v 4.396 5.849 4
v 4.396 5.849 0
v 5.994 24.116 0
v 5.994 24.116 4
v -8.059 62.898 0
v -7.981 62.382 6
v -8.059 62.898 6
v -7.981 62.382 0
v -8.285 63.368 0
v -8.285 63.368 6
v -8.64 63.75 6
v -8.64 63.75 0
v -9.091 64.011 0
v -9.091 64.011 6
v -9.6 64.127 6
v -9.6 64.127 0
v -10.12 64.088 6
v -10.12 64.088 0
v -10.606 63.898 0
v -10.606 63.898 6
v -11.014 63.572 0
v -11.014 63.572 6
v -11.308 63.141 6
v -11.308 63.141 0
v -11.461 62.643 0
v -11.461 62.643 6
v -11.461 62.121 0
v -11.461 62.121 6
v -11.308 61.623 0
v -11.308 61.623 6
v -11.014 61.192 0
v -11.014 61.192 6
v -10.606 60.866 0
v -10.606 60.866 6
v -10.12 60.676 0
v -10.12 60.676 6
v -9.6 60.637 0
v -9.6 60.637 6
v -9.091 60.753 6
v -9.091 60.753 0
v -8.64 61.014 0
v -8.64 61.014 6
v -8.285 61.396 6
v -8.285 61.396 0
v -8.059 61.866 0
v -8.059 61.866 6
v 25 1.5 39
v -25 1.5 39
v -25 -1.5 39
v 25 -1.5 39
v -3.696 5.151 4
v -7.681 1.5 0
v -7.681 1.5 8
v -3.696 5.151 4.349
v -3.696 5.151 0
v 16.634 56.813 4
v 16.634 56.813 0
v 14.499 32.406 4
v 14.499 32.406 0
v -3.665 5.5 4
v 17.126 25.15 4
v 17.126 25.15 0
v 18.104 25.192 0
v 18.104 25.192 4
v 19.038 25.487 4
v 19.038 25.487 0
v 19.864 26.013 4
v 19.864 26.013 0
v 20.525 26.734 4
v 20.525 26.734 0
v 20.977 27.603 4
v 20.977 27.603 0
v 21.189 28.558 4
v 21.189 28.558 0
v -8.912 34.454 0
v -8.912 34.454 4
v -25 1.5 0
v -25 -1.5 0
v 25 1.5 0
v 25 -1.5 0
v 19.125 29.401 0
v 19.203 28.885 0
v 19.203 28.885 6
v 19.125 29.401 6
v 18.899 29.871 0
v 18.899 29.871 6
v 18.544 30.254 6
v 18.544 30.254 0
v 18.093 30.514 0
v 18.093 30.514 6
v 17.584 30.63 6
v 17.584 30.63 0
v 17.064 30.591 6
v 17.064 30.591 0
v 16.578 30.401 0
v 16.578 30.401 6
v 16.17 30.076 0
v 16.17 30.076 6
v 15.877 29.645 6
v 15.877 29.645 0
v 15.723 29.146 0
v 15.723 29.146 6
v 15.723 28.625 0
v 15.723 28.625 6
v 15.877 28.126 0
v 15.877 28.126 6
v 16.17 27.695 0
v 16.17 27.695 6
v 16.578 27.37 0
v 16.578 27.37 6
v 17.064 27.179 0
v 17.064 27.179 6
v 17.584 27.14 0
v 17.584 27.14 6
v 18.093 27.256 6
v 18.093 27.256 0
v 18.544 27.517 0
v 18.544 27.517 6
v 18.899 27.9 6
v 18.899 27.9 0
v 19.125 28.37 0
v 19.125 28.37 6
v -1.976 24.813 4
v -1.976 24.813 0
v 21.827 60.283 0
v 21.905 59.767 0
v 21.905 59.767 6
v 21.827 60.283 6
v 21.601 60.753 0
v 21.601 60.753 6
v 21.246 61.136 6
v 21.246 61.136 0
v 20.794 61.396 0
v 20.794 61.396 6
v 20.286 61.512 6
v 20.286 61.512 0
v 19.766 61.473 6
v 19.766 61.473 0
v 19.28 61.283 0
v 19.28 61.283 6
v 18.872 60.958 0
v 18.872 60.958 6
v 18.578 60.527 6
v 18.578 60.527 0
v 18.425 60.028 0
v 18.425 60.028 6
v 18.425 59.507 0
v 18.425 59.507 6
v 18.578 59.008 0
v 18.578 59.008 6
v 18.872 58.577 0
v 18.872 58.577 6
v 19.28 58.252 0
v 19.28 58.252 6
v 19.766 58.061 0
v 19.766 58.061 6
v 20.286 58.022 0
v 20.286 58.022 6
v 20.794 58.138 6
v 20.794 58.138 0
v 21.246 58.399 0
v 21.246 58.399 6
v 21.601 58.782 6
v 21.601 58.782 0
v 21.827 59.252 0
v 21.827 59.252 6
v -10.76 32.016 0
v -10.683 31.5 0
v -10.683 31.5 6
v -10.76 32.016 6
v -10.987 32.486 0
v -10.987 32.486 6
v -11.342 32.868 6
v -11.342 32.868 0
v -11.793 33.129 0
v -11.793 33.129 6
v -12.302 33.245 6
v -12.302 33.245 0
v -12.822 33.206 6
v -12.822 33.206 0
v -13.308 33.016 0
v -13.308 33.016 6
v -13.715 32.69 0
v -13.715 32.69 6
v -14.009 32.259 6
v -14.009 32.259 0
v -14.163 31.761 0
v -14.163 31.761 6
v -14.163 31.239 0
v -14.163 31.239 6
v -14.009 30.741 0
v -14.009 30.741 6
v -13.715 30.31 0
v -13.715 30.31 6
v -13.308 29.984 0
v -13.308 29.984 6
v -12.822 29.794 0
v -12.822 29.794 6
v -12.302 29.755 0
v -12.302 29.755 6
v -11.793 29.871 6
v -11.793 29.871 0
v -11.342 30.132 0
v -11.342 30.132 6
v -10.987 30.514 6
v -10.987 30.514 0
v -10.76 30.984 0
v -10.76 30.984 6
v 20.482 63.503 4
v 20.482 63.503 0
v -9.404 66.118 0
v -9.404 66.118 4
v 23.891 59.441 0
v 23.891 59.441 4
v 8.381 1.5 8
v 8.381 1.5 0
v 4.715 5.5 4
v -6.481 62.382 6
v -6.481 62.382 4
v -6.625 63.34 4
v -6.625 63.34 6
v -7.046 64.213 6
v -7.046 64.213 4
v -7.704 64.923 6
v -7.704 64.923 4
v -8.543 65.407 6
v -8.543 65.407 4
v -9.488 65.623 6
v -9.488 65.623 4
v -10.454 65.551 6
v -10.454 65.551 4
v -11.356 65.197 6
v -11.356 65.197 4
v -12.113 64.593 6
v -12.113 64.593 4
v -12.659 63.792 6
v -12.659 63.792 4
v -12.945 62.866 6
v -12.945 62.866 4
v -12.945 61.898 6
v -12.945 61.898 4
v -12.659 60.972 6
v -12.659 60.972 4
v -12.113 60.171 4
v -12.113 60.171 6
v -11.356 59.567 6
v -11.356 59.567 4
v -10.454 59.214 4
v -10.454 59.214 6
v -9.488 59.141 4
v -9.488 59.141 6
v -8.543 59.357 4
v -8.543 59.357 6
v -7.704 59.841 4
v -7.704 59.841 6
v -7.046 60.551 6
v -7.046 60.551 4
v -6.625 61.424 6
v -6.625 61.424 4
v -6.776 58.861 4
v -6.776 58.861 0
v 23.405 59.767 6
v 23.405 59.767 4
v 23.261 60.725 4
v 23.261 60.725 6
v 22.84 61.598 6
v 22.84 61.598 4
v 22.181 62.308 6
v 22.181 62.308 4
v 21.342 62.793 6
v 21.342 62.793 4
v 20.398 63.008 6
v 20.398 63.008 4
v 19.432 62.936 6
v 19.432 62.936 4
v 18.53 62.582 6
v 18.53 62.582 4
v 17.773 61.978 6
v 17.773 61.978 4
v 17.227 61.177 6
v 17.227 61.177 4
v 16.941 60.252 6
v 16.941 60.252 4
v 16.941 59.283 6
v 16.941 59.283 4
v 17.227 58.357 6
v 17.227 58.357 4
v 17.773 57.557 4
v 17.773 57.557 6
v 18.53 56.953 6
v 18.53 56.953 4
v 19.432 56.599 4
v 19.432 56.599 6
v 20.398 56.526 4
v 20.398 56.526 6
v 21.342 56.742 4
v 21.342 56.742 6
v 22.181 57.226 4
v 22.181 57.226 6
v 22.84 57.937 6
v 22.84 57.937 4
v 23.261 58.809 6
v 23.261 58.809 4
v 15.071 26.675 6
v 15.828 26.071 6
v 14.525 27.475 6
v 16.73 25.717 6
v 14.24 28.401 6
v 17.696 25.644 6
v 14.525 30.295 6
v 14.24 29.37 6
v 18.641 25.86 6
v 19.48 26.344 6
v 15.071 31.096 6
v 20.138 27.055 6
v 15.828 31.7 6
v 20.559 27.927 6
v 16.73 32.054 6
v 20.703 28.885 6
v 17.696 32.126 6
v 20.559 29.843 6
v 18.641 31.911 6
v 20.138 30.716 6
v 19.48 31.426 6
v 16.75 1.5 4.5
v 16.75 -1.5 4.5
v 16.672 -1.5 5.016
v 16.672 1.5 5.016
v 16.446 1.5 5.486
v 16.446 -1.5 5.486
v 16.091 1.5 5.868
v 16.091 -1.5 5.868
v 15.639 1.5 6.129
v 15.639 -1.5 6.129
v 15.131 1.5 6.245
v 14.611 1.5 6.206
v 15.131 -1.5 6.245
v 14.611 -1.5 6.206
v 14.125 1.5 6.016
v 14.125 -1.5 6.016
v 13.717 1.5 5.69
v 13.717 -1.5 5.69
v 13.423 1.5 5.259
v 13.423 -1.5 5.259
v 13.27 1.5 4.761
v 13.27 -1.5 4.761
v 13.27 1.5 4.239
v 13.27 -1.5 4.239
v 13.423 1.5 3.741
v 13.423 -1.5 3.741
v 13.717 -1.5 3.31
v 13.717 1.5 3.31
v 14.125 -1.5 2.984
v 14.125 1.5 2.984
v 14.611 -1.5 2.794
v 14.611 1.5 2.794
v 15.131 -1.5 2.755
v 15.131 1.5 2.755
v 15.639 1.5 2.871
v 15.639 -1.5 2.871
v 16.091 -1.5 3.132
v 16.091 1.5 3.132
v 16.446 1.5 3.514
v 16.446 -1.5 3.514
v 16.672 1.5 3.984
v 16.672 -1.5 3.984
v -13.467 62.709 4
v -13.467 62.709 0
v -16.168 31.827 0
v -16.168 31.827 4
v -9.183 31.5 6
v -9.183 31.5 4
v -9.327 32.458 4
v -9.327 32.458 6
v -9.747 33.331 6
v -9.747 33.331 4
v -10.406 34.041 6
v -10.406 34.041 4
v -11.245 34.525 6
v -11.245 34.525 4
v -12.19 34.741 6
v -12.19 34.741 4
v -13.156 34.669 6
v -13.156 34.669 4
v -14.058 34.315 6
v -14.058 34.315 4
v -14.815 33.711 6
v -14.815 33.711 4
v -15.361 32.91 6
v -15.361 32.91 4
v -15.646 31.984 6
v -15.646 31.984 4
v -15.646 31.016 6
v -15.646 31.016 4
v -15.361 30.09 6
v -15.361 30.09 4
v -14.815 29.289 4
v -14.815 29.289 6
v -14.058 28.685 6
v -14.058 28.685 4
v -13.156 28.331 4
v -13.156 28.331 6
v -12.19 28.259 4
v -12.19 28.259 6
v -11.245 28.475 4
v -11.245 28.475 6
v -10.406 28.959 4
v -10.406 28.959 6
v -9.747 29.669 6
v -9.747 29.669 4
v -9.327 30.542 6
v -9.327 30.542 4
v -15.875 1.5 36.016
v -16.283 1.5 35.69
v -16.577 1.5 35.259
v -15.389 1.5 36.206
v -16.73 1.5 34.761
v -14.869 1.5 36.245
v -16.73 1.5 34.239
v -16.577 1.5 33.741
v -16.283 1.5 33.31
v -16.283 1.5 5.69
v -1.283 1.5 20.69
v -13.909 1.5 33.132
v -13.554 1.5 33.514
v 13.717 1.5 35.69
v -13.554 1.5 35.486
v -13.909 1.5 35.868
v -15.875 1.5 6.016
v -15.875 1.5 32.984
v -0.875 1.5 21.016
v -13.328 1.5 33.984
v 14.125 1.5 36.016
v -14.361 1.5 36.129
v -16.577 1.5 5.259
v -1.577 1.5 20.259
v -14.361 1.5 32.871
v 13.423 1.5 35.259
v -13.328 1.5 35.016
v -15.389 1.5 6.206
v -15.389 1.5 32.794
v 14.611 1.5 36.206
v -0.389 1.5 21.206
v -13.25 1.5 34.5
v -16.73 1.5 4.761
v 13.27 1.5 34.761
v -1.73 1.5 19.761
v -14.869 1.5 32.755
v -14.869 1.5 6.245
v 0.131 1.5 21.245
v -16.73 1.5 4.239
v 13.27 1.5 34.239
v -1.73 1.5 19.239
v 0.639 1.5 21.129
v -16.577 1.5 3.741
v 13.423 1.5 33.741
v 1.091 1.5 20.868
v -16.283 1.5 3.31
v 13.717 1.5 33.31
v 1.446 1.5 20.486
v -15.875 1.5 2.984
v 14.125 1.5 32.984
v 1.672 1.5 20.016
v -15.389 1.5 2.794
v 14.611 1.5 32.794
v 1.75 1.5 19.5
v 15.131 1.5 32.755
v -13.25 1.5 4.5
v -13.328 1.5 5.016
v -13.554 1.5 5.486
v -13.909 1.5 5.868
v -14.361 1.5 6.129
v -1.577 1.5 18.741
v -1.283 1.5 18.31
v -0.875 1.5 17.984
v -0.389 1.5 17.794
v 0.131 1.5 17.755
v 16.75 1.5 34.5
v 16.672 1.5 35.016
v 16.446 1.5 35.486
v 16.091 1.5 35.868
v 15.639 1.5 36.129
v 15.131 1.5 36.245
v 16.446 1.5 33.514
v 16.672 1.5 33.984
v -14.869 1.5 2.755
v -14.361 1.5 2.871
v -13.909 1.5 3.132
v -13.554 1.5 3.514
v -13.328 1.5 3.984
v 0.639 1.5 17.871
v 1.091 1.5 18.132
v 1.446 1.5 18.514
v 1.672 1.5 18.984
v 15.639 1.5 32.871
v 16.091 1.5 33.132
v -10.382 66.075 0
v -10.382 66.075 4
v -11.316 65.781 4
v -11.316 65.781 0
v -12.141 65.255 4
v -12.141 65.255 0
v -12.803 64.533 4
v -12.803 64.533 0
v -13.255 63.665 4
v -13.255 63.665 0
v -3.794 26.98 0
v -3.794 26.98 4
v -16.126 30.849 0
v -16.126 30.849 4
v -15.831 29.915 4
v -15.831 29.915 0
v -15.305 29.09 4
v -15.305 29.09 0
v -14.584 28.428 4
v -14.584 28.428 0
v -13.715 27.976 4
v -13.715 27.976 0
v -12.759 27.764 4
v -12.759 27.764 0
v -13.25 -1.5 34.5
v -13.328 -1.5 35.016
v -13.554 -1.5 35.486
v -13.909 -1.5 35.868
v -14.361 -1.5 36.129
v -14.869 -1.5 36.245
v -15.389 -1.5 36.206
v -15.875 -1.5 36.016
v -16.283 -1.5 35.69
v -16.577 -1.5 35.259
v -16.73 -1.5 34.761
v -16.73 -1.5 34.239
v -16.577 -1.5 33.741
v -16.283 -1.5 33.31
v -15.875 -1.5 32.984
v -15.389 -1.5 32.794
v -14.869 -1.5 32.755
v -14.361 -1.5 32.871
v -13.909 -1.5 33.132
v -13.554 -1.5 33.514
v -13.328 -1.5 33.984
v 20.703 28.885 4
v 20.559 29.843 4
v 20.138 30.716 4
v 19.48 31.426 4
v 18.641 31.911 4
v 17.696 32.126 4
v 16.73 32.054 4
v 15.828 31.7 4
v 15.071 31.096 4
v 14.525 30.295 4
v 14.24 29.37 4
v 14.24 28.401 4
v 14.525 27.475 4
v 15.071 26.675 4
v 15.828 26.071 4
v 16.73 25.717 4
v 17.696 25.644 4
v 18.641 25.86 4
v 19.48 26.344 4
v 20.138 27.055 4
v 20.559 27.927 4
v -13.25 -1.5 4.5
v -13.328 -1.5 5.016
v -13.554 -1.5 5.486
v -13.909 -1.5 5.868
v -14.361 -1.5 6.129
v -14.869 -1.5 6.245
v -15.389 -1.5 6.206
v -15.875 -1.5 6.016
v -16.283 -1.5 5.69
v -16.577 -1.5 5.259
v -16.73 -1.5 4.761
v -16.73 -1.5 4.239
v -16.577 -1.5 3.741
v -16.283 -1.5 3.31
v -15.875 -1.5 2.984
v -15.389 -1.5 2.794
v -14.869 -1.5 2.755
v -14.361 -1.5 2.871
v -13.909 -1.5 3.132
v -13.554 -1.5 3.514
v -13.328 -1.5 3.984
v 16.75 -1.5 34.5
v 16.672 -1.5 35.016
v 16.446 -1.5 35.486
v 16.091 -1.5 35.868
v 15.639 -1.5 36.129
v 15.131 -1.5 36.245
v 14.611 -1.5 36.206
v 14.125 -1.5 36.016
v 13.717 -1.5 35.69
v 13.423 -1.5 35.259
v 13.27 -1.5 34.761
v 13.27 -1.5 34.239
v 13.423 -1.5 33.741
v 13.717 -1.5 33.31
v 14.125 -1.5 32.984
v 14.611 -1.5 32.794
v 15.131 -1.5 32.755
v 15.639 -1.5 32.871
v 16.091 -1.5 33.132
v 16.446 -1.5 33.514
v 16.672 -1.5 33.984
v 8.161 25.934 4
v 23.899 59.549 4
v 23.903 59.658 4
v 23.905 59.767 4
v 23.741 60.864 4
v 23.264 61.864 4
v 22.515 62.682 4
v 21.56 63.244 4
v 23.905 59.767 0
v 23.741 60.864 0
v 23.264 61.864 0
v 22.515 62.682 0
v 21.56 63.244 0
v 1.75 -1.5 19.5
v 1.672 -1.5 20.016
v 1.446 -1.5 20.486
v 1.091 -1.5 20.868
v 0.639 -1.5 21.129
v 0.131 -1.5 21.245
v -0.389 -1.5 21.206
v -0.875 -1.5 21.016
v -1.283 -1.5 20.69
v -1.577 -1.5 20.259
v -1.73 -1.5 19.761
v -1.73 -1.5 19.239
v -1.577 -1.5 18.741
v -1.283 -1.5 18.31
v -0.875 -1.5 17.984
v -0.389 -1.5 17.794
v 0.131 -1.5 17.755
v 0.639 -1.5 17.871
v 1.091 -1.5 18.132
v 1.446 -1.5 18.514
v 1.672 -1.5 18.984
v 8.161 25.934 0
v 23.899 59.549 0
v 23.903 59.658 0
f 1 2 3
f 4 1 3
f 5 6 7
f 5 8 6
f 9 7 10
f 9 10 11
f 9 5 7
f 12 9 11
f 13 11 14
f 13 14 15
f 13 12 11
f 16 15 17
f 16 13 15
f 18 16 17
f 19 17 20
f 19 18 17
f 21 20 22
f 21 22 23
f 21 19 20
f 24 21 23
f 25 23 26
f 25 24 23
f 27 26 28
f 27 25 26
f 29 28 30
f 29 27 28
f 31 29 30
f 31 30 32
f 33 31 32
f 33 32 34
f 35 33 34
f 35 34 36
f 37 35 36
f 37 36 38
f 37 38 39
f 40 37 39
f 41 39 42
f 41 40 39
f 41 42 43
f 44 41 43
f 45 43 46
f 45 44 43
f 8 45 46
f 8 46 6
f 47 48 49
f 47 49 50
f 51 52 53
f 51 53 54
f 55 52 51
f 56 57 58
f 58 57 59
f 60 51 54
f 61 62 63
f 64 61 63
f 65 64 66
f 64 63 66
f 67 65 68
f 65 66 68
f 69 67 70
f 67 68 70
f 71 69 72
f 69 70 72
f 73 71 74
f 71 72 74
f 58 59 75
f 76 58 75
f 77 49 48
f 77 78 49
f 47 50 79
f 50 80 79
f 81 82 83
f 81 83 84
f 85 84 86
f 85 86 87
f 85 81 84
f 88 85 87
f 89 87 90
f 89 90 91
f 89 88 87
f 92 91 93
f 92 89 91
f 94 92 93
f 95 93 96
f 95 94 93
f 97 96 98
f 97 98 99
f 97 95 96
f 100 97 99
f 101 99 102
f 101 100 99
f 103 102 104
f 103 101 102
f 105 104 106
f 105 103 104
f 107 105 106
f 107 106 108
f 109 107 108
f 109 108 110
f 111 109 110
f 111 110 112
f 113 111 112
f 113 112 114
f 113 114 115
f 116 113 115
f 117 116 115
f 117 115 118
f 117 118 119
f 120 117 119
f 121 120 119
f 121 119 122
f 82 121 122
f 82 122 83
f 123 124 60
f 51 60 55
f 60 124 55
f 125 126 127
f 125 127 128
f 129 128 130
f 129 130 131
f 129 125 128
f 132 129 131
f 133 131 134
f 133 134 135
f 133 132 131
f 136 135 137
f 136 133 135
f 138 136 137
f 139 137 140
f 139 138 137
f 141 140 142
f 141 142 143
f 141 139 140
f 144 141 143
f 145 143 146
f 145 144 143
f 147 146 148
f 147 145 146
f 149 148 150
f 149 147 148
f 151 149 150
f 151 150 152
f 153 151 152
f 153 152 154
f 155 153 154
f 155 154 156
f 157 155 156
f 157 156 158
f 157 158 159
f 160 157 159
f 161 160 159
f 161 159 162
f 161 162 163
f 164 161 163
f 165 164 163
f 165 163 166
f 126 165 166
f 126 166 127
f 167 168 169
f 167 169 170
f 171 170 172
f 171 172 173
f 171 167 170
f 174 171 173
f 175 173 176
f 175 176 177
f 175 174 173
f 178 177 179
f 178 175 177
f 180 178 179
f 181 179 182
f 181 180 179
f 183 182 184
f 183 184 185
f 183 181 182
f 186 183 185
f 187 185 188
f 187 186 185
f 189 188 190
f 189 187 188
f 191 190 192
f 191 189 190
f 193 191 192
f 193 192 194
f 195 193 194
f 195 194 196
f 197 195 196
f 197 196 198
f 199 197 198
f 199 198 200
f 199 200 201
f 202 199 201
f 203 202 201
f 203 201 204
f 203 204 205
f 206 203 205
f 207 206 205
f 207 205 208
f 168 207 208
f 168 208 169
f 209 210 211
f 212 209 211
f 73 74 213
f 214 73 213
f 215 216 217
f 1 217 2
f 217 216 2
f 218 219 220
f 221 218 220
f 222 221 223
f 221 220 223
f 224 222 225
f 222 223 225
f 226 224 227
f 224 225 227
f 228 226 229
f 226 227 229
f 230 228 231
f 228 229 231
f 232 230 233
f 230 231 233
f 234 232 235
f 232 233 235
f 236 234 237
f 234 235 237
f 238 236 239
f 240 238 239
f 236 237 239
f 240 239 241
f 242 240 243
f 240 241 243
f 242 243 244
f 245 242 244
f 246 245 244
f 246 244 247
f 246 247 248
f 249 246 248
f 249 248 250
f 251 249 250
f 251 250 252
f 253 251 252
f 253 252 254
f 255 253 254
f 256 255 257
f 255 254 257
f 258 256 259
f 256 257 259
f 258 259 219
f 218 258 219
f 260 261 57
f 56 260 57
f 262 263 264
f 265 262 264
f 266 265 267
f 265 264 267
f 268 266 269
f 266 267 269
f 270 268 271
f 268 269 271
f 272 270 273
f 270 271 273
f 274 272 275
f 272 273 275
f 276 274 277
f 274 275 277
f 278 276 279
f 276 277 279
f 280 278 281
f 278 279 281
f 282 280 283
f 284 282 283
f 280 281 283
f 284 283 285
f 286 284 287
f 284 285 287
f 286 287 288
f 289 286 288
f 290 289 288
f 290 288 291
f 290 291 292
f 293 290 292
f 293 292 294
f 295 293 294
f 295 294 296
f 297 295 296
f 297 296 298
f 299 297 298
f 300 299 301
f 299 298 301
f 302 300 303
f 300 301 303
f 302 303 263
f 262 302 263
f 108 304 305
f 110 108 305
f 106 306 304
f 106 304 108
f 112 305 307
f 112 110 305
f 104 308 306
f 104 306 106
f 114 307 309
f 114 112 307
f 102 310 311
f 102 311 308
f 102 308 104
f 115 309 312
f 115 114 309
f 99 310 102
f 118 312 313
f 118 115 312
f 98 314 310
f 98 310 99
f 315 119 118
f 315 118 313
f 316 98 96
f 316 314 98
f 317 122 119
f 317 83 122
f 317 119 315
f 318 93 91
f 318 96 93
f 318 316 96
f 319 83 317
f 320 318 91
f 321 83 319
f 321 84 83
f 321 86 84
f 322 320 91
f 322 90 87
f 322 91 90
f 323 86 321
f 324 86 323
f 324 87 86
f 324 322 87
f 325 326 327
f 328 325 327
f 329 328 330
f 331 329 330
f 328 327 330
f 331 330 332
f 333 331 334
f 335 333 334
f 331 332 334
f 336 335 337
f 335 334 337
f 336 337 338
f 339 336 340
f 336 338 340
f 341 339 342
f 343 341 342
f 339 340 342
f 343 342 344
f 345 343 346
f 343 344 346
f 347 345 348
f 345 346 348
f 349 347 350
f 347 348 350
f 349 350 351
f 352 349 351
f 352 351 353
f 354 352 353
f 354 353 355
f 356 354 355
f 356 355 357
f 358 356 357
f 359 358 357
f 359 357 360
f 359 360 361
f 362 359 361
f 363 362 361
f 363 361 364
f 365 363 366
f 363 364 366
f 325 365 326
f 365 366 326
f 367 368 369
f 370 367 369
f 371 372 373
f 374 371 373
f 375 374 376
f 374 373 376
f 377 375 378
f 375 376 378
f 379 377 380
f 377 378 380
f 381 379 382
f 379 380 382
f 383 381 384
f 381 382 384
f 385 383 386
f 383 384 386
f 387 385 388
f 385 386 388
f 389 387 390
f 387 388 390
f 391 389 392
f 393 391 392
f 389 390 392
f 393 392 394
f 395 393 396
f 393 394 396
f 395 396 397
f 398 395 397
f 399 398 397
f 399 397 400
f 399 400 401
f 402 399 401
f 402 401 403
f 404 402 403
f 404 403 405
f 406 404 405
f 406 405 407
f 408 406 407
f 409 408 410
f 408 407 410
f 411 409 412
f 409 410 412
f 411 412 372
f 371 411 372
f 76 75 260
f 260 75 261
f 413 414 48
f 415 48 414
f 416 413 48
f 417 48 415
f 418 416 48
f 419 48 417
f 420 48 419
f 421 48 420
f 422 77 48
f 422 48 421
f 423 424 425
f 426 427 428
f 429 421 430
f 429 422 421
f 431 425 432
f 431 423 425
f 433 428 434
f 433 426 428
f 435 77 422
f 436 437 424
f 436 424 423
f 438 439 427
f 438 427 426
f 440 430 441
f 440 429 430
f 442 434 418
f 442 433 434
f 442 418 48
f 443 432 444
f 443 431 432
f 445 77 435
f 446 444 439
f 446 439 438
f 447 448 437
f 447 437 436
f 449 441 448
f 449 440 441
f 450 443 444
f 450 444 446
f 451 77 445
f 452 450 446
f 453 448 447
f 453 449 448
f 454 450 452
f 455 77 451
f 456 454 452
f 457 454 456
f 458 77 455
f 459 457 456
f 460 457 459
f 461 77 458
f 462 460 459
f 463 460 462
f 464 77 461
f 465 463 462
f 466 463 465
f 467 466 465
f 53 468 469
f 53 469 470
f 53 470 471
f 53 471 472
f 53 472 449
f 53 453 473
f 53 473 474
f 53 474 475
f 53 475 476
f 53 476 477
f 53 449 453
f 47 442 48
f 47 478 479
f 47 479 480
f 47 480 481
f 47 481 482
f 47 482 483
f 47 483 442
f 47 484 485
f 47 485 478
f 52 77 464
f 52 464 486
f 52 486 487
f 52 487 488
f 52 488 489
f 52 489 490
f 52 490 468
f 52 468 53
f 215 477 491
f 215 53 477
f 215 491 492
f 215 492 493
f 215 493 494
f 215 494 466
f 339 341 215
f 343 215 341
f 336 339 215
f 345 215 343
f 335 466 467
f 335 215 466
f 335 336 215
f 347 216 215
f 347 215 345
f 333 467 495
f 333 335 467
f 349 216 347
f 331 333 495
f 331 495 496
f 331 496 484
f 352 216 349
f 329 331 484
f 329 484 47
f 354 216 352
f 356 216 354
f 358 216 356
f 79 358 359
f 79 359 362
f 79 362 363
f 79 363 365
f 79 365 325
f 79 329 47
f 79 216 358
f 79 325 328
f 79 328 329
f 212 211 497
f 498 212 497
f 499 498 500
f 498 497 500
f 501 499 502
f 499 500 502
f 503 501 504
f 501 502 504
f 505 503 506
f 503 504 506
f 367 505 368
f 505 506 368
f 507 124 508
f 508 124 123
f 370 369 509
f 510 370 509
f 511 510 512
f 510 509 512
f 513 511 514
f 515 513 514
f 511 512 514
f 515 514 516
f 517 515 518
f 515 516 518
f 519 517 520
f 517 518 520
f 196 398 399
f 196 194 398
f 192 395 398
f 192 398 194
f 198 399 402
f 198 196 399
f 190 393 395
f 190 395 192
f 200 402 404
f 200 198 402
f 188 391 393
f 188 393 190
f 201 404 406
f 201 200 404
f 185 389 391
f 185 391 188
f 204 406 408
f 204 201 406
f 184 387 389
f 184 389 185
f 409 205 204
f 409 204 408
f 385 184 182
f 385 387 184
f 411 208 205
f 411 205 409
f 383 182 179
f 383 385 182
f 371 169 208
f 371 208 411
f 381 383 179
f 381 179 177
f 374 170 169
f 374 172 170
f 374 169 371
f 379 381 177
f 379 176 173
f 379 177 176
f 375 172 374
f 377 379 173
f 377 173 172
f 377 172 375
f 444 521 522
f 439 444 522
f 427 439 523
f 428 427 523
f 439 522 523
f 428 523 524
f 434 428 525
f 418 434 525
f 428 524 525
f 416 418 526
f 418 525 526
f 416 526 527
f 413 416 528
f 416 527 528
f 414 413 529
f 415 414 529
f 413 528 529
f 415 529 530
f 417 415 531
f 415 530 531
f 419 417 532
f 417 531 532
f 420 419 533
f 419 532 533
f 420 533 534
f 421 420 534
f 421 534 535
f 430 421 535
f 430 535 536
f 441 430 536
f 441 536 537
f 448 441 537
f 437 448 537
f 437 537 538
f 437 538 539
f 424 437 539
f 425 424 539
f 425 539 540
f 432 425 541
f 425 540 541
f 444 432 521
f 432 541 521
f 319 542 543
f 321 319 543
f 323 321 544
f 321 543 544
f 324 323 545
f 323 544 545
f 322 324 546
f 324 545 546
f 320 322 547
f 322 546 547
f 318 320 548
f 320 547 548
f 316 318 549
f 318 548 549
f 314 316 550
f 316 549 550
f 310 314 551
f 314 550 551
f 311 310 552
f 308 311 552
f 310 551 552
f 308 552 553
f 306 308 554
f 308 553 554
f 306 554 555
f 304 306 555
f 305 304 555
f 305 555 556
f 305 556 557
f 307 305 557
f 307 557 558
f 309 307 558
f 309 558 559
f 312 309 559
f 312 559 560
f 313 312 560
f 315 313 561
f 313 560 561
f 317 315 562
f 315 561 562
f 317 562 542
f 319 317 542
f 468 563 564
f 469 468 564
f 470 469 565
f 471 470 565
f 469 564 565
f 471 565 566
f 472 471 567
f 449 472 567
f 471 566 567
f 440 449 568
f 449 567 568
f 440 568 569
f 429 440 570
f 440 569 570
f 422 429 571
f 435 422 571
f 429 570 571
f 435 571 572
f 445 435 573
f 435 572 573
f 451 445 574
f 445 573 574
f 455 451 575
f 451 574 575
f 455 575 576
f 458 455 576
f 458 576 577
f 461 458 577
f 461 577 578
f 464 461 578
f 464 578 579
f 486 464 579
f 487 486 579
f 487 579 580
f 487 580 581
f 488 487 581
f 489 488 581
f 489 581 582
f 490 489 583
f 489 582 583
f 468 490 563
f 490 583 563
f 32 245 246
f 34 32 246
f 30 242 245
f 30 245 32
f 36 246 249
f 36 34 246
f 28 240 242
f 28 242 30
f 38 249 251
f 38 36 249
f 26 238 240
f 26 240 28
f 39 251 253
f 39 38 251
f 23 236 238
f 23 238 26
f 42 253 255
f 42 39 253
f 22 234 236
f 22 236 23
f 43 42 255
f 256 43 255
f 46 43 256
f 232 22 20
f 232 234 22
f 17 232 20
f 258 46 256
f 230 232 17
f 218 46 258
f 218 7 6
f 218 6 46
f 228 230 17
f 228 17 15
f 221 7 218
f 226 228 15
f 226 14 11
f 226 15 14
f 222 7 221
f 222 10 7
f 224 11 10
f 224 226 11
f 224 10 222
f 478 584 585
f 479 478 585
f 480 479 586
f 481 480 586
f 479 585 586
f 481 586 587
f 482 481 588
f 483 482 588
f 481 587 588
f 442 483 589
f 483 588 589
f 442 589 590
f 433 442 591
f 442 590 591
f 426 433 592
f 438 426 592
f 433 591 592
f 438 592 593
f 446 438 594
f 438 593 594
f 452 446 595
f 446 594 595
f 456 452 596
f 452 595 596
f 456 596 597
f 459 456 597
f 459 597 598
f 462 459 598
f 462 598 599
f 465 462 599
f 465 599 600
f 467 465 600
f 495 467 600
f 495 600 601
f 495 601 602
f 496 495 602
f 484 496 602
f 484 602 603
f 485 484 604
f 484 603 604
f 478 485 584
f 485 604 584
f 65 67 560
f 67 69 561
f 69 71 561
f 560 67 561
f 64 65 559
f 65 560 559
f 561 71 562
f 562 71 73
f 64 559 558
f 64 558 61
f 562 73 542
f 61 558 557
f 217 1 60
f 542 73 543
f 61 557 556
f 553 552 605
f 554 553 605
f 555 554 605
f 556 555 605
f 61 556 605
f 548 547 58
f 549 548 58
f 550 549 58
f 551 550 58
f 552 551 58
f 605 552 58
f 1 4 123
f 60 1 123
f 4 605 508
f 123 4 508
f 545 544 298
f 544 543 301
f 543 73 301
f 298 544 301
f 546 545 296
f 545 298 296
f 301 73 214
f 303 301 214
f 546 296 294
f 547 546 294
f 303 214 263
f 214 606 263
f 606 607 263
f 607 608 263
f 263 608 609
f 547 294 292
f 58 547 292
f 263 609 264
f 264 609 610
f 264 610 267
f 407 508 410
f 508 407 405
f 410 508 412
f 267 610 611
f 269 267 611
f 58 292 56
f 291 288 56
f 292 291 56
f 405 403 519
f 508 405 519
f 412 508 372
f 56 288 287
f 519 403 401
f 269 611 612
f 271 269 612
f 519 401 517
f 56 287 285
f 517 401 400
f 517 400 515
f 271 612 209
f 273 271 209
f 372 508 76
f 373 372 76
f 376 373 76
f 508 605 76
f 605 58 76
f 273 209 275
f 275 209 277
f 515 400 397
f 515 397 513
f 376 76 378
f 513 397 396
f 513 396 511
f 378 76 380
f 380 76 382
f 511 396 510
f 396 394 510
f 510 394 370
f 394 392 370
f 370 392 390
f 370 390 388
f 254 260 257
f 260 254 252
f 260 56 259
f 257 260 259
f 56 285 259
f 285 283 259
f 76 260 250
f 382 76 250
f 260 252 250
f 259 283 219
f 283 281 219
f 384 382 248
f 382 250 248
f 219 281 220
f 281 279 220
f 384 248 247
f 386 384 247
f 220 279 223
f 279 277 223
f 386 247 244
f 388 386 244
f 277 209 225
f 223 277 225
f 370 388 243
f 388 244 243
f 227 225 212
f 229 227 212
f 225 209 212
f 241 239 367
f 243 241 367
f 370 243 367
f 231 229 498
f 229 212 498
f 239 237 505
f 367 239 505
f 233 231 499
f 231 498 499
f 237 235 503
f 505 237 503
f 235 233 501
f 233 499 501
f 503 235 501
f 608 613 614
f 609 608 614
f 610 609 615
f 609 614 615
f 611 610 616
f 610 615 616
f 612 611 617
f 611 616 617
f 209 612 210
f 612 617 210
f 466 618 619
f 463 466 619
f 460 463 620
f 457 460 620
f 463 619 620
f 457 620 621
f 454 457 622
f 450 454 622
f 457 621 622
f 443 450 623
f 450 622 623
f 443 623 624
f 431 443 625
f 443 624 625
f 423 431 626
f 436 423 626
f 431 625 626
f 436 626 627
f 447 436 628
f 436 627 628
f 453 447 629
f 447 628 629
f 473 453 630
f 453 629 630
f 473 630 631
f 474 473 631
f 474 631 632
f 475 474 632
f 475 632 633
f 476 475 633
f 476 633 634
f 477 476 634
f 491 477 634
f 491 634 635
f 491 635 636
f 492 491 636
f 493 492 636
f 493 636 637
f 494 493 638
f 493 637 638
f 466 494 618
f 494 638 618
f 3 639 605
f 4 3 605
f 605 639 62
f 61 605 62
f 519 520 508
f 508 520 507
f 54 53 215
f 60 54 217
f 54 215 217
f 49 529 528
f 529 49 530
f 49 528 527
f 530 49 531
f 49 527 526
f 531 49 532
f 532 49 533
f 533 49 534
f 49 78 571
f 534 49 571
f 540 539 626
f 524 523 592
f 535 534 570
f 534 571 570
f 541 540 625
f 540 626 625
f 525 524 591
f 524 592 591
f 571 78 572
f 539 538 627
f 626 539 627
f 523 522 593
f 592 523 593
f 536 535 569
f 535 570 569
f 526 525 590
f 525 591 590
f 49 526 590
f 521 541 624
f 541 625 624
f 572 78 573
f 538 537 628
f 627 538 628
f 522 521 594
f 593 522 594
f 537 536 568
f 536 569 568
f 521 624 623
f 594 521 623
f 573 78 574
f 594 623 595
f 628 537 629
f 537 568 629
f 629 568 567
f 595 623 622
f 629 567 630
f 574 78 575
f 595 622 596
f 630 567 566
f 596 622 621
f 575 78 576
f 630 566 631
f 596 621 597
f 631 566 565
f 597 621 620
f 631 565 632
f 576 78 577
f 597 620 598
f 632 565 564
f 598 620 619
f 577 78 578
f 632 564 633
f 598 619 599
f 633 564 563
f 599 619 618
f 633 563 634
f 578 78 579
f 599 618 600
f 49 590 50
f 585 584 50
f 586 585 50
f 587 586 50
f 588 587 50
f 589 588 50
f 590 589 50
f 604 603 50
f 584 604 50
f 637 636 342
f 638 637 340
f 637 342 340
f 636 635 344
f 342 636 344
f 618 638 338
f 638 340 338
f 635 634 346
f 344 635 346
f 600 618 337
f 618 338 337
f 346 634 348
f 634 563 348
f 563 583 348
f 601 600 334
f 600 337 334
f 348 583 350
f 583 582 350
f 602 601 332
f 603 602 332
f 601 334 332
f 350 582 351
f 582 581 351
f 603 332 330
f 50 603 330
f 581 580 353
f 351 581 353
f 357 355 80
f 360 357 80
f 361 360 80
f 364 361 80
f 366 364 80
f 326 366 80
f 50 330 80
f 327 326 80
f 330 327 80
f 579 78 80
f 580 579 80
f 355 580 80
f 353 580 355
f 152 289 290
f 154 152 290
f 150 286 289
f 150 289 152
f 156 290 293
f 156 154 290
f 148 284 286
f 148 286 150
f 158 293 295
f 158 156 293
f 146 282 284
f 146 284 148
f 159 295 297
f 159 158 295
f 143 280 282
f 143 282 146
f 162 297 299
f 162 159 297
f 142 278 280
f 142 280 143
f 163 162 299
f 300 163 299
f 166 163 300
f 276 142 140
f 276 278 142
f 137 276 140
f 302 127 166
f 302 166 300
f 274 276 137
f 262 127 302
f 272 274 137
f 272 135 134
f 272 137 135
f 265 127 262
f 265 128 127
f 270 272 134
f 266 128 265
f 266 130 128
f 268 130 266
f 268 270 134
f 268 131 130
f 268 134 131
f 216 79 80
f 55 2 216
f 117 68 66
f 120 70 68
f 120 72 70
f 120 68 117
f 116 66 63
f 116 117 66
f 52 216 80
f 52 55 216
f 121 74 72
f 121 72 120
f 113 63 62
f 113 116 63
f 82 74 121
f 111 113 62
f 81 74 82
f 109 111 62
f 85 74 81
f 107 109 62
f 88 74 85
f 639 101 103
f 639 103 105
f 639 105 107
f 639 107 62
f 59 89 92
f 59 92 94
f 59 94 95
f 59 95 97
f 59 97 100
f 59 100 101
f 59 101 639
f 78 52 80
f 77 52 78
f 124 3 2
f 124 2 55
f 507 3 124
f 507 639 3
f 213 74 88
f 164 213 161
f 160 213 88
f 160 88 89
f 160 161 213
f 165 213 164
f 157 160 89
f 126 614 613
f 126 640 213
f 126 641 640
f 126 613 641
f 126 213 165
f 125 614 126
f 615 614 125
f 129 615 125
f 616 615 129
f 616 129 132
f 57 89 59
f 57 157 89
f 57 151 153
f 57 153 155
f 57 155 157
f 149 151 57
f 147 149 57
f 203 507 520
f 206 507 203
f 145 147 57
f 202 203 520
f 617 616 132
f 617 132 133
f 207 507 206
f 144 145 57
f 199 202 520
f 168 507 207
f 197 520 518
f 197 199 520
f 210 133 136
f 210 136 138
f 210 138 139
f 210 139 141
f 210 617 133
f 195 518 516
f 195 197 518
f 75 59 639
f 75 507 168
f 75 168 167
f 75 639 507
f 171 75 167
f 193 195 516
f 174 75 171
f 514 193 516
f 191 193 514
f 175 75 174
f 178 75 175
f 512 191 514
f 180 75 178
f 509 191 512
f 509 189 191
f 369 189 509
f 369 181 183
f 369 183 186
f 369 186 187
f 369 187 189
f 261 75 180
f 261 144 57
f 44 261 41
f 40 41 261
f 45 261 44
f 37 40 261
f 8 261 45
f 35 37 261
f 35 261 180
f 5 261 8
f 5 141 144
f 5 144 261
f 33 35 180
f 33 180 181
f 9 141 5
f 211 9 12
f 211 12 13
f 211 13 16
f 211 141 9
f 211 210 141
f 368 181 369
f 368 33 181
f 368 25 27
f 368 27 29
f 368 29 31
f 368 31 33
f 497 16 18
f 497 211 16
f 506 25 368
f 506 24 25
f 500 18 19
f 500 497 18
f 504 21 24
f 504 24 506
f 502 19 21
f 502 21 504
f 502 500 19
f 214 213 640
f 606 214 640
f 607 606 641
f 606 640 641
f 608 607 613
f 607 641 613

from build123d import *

# Parameters (mm, degrees)
F0_R         = 1.75
F1_DEPTH     = 4
F2_W         = 50
F2_H         = 3
F3_DEPTH     = 35
F4_R         = 1.75
F5_DEPTH     = 3
F6_T1_DEPTH  = 4
F6_T6_DEPTH  = 28.6040226041
F6_T13_DEPTH = 28.6040226041
F6_S15_R     = 1.75
F6_T16_DEPTH = 16
F6_T19_DEPTH = 15.1872089077
F6_T26_DEPTH = 13.4620824192
F6_T30_DEPTH = 28.6040226041
F6_S32_R     = 1.75
F6_T33_DEPTH = 16
F7_R         = 3.25
F7_R_2       = 1.75
F8_DEPTH     = 2
F9_SIZE      = 2


# Not quite as in the source:
# - a fillet or chamfer that OpenCascade refuses, or shapes differently, is made with other operations: its cross-section is extruded or revolved along the edge and cut away or added


with BuildPart() as f1:
    # F0 (on Top) → F1 (new body)
    with BuildSketch(Plane.XY):
        Polygon((-4.0152793502, 1.5), (-25, 1.5), (-25, -1.5), (25, -1.5), (25, 1.5), (4.0152793502, 1.5), align=None)
        Polygon((-1.8013300137, 26.8055567119), (-4.0152793502, 1.5), (4.0152793502, 1.5), (6.1682275711, 26.10831077), align=None)
        with BuildLine():
            Line((-12.7594716927, 27.7642698822), (-1.8013300137, 26.8055567119))
            Line((-1.8013300137, 26.8055567119), (-1.4744959784, 30.5412868298))
            Line((-1.4744959784, 30.5412868298), (6.4950616064, 29.8440408878))
            Line((6.4950616064, 29.8440408878), (6.1682275711, 26.10831077))
            Line((6.1682275711, 26.10831077), (17.1263692501, 25.1495975997))
            ThreePointArc((17.1263692501, 25.1495975997), (14.9197400068, 31.6501177306), (21.2032032854, 28.8853277176))
            ThreePointArc((21.2032032854, 28.8853277176), (21.1996341163, 28.721755015), (21.1889334032, 28.5584936823))
            Line((21.1889334032, 28.5584936823), (23.8907614284, 59.4405293231))
            ThreePointArc((23.8907614284, 59.4405293231), (17.2823646489, 57.3569098221), (20.4818653459, 63.5030934763))
            Line((20.4818653459, 63.5030934763), (-9.4039755969, 66.1177657587))
            ThreePointArc((-9.4039755969, 66.1177657587), (-6.9660196192, 64.9154989194), (-5.9808096322, 62.3820356408))
            ThreePointArc((-5.9808096322, 62.3820356408), (-9.8943823348, 58.6356048099), (-13.46653975, 62.7088696761))
            Line((-13.46653975, 62.7088696761), (-16.1683677752, 31.8268340353))
            ThreePointArc((-16.1683677752, 31.8268340353), (-12.2690649548, 35.2464308309), (-8.6826376574, 31.5))
            ThreePointArc((-8.6826376574, 31.5), (-9.8991743788, 28.735209987), (-12.7594716927, 27.7642698822))
        make_face()
        Polygon((-8.9117487246, 34.4543766049), (-6.7764330273, 58.8611467081), (16.6341423778, 56.8129867535), (14.4988266805, 32.4062166503), align=None, mode=Mode.SUBTRACT)
        Polygon((-1.4744959784, 30.5412868298), (-1.8013300137, 26.8055567119), (6.1682275711, 26.10831077), (6.4950616064, 29.8440408878), align=None)
        with BuildLine():
            ThreePointArc((-16.1683677752, 31.8268340353), (-15.3053043191, 29.0895464637), (-12.7594716927, 27.7642698822))
            ThreePointArc((-12.7594716927, 27.7642698822), (-9.8991743788, 28.735209987), (-8.6826376574, 31.5))
            ThreePointArc((-8.6826376574, 31.5), (-12.2690649548, 35.2464308309), (-16.1683677752, 31.8268340353))
        make_face()
        with Locations((-12.4326376574, 31.5)):
            Circle(F0_R, mode=Mode.SUBTRACT)
        with BuildLine():
            ThreePointArc((21.2032032854, 28.8853277176), (14.9197400068, 31.6501177306), (17.1263692501, 25.1495975997))
            ThreePointArc((17.1263692501, 25.1495975997), (19.8636568217, 26.0126610559), (21.1889334032, 28.5584936823))
            ThreePointArc((21.1889334032, 28.5584936823), (21.1996341163, 28.721755015), (21.2032032854, 28.8853277176))
        make_face()
        with Locations((17.4532032854, 28.8853277176)):
            Circle(F0_R, mode=Mode.SUBTRACT)
        with BuildLine():
            ThreePointArc((-9.4039755969, 66.1177657587), (-12.1412631685, 65.2547023025), (-13.46653975, 62.7088696761))
            ThreePointArc((-13.46653975, 62.7088696761), (-9.8943823348, 58.6356048099), (-5.9808096322, 62.3820356408))
            ThreePointArc((-5.9808096322, 62.3820356408), (-6.9660196192, 64.9154989194), (-9.4039755969, 66.1177657587))
        make_face()
        with Locations((-9.7308096322, 62.3820356408)):
            Circle(F0_R, mode=Mode.SUBTRACT)
        with BuildLine():
            ThreePointArc((20.4818653459, 63.5030934763), (17.2823646489, 57.3569098221), (23.8907614284, 59.4405293231))
            ThreePointArc((23.8907614284, 59.4405293231), (23.9014621415, 59.6037906558), (23.9050313106, 59.7673633584))
            ThreePointArc((23.9050313106, 59.7673633584), (22.9198213236, 62.300826637), (20.4818653459, 63.5030934763))
        make_face()
        with Locations((20.1550313106, 59.7673633584)):
            Circle(F0_R, mode=Mode.SUBTRACT)
    extrude(amount=F1_DEPTH)

    # F2 (on face) → F3 (join)
    with BuildSketch(Plane.XY.offset(4)):
        Rectangle(F2_W, F2_H)
    extrude(amount=F3_DEPTH)

    # F4 (on face) → F5 (cut, through all)
    with BuildSketch(Plane.XZ.offset(1.5)):
        with Locations((-15, 34.5)):
            Circle(F4_R)
        with Locations((15, 34.5)):
            Circle(F4_R)
        with Locations((-15, 4.5)):
            Circle(F4_R)
        with Locations((15, 4.5)):
            Circle(F4_R)
        with Locations((0, 19.5)):
            Circle(F4_R)
    extrude(amount=-F5_DEPTH, mode=Mode.SUBTRACT)

    # F6: chamfer of 4 on 3 edges, made by hand

    # F6_s2 → F6_t1 (join)
    with BuildSketch(Plane.XY):
        Polygon((-7.6806040462, 1.5), (-3.6958252539, 5.151377029), (-4.0152793502, 1.5), align=None)
        Polygon((8.3805133545, 1.5), (4.3957345621, 5.848622971), (4.0152793502, 1.5), align=None)
    extrude(amount=F6_T1_DEPTH)


with BuildPart() as f6_tool4:
    # F6_s5 → F6_t6 (new body)
    with BuildSketch(Plane.YZ.offset(14.302011302)):
        Polygon((1.5, 8), (5.5, 4), (1.5, 4), align=None)
    extrude(amount=-F6_T6_DEPTH)

    split(bisect_by=Plane(origin=(-4.1150149256, 0.3600171562, 0), x_dir=(0, 0, 1), z_dir=(0.9961946981, -0.0871557427, 0)), keep=Keep.TOP)

    split(bisect_by=Plane(origin=(3.8545426591, -0.3372287857, 0), x_dir=(0, 0, 1), z_dir=(-0.9961946981, 0.0871557427, 0)), keep=Keep.TOP)


with BuildPart() as f1_1:
    add(f1.part)

    # F6_t3: union F6_tool4
    add(f6_tool4.part)


with BuildPart() as f6_tool11:
    # F6_s12 → F6_t13 (new body)
    with BuildSketch(Plane.YZ.offset(14.302011302)):
        Polygon((1.5, 8), (5.5, 4), (1.5, 4), align=None)
    extrude(amount=-F6_T13_DEPTH)

    split(bisect_by=Plane(origin=(3.8545426591, -0.3372287857, 0), x_dir=(0, 0, 1), z_dir=(0.9961946981, -0.0871557427, 0)), keep=Keep.TOP)

    # F6_s15 → F6_t16 (cut, symmetric)
    with BuildSketch(Plane.XZ.offset(-3.5)):
        with Locations((15, 4.5)):
            Circle(F6_S15_R)
    extrude(amount=F6_T16_DEPTH, both=True, mode=Mode.SUBTRACT)


with BuildPart() as f6_tool17:
    # F6_s18 → F6_t19 (new body)
    with BuildSketch(Plane.XY):
        Polygon((8.3805133545, 1.5), (4.3957345621, 5.848622971), (4.0152793502, 1.5), align=None)
    extrude(amount=F6_T19_DEPTH)

    split(bisect_by=Plane.XY.offset(4), keep=Keep.TOP)


with BuildPart() as f6_tool11_1:
    add(f6_tool11.part)

    # F6_t21: intersect F6_tool17
    add(f6_tool17.part, mode=Mode.INTERSECT)


with BuildPart() as f1_2:
    add(f1_1.part)

    # F6_t9: union F6_tool11
    add(f6_tool11_1.part)


with BuildPart() as f6_tool24:
    # F6_s25 → F6_t26 (new body)
    with BuildSketch(Plane.XY):
        Polygon((-7.6806040462, 1.5), (-3.6958252539, 5.151377029), (-4.0152793502, 1.5), align=None)
    extrude(amount=F6_T26_DEPTH)

    split(bisect_by=Plane.XY.offset(4), keep=Keep.TOP)


with BuildPart() as f6_tool28:
    # F6_s29 → F6_t30 (new body)
    with BuildSketch(Plane.YZ.offset(14.302011302)):
        Polygon((1.5, 8), (5.5, 4), (1.5, 4), align=None)
    extrude(amount=-F6_T30_DEPTH)

    split(bisect_by=Plane(origin=(-4.1150149256, 0.3600171562, 0), x_dir=(0, 0, 1), z_dir=(-0.9961946981, 0.0871557427, 0)), keep=Keep.TOP)

    # F6_s32 → F6_t33 (cut, symmetric)
    with BuildSketch(Plane.XZ.offset(-3.5)):
        with Locations((-15, 4.5)):
            Circle(F6_S32_R)
    extrude(amount=F6_T33_DEPTH, both=True, mode=Mode.SUBTRACT)


with BuildPart() as f6_tool24_1:
    add(f6_tool24.part)

    # F6_t34: intersect F6_tool28
    add(f6_tool28.part, mode=Mode.INTERSECT)


with BuildPart() as f1_3:
    add(f1_2.part)

    # F6_t22: union F6_tool24
    add(f6_tool24_1.part)

    # F7 (on face) → F8 (join)
    with BuildSketch(Plane.XY.offset(4)):
        with Locations((-9.7308096322, 62.3820356408)):
            Circle(F7_R)
        with Locations((-9.7308096322, 62.3820356408)):
            Circle(F7_R_2, mode=Mode.SUBTRACT)
        with Locations((20.1550313106, 59.7673633584)):
            Circle(F7_R)
        with Locations((20.1550313106, 59.7673633584)):
            Circle(F7_R_2, mode=Mode.SUBTRACT)
        with Locations((17.4532032854, 28.8853277176)):
            Circle(F7_R)
        with Locations((17.4532032854, 28.8853277176)):
            Circle(F7_R_2, mode=Mode.SUBTRACT)
        with Locations((-12.4326376574, 31.5)):
            Circle(F7_R)
        with Locations((-12.4326376574, 31.5)):
            Circle(F7_R_2, mode=Mode.SUBTRACT)
    extrude(amount=F8_DEPTH)

    # F9
    f9_edges = [f1_3.edges().sort_by_distance(p)[0] for p in [
        (6.168228, 26.108311, 2),
        (-1.80133, 26.805557, 2),
    ]]
    chamfer(f9_edges, length=F9_SIZE)


solid = f1_3.part
